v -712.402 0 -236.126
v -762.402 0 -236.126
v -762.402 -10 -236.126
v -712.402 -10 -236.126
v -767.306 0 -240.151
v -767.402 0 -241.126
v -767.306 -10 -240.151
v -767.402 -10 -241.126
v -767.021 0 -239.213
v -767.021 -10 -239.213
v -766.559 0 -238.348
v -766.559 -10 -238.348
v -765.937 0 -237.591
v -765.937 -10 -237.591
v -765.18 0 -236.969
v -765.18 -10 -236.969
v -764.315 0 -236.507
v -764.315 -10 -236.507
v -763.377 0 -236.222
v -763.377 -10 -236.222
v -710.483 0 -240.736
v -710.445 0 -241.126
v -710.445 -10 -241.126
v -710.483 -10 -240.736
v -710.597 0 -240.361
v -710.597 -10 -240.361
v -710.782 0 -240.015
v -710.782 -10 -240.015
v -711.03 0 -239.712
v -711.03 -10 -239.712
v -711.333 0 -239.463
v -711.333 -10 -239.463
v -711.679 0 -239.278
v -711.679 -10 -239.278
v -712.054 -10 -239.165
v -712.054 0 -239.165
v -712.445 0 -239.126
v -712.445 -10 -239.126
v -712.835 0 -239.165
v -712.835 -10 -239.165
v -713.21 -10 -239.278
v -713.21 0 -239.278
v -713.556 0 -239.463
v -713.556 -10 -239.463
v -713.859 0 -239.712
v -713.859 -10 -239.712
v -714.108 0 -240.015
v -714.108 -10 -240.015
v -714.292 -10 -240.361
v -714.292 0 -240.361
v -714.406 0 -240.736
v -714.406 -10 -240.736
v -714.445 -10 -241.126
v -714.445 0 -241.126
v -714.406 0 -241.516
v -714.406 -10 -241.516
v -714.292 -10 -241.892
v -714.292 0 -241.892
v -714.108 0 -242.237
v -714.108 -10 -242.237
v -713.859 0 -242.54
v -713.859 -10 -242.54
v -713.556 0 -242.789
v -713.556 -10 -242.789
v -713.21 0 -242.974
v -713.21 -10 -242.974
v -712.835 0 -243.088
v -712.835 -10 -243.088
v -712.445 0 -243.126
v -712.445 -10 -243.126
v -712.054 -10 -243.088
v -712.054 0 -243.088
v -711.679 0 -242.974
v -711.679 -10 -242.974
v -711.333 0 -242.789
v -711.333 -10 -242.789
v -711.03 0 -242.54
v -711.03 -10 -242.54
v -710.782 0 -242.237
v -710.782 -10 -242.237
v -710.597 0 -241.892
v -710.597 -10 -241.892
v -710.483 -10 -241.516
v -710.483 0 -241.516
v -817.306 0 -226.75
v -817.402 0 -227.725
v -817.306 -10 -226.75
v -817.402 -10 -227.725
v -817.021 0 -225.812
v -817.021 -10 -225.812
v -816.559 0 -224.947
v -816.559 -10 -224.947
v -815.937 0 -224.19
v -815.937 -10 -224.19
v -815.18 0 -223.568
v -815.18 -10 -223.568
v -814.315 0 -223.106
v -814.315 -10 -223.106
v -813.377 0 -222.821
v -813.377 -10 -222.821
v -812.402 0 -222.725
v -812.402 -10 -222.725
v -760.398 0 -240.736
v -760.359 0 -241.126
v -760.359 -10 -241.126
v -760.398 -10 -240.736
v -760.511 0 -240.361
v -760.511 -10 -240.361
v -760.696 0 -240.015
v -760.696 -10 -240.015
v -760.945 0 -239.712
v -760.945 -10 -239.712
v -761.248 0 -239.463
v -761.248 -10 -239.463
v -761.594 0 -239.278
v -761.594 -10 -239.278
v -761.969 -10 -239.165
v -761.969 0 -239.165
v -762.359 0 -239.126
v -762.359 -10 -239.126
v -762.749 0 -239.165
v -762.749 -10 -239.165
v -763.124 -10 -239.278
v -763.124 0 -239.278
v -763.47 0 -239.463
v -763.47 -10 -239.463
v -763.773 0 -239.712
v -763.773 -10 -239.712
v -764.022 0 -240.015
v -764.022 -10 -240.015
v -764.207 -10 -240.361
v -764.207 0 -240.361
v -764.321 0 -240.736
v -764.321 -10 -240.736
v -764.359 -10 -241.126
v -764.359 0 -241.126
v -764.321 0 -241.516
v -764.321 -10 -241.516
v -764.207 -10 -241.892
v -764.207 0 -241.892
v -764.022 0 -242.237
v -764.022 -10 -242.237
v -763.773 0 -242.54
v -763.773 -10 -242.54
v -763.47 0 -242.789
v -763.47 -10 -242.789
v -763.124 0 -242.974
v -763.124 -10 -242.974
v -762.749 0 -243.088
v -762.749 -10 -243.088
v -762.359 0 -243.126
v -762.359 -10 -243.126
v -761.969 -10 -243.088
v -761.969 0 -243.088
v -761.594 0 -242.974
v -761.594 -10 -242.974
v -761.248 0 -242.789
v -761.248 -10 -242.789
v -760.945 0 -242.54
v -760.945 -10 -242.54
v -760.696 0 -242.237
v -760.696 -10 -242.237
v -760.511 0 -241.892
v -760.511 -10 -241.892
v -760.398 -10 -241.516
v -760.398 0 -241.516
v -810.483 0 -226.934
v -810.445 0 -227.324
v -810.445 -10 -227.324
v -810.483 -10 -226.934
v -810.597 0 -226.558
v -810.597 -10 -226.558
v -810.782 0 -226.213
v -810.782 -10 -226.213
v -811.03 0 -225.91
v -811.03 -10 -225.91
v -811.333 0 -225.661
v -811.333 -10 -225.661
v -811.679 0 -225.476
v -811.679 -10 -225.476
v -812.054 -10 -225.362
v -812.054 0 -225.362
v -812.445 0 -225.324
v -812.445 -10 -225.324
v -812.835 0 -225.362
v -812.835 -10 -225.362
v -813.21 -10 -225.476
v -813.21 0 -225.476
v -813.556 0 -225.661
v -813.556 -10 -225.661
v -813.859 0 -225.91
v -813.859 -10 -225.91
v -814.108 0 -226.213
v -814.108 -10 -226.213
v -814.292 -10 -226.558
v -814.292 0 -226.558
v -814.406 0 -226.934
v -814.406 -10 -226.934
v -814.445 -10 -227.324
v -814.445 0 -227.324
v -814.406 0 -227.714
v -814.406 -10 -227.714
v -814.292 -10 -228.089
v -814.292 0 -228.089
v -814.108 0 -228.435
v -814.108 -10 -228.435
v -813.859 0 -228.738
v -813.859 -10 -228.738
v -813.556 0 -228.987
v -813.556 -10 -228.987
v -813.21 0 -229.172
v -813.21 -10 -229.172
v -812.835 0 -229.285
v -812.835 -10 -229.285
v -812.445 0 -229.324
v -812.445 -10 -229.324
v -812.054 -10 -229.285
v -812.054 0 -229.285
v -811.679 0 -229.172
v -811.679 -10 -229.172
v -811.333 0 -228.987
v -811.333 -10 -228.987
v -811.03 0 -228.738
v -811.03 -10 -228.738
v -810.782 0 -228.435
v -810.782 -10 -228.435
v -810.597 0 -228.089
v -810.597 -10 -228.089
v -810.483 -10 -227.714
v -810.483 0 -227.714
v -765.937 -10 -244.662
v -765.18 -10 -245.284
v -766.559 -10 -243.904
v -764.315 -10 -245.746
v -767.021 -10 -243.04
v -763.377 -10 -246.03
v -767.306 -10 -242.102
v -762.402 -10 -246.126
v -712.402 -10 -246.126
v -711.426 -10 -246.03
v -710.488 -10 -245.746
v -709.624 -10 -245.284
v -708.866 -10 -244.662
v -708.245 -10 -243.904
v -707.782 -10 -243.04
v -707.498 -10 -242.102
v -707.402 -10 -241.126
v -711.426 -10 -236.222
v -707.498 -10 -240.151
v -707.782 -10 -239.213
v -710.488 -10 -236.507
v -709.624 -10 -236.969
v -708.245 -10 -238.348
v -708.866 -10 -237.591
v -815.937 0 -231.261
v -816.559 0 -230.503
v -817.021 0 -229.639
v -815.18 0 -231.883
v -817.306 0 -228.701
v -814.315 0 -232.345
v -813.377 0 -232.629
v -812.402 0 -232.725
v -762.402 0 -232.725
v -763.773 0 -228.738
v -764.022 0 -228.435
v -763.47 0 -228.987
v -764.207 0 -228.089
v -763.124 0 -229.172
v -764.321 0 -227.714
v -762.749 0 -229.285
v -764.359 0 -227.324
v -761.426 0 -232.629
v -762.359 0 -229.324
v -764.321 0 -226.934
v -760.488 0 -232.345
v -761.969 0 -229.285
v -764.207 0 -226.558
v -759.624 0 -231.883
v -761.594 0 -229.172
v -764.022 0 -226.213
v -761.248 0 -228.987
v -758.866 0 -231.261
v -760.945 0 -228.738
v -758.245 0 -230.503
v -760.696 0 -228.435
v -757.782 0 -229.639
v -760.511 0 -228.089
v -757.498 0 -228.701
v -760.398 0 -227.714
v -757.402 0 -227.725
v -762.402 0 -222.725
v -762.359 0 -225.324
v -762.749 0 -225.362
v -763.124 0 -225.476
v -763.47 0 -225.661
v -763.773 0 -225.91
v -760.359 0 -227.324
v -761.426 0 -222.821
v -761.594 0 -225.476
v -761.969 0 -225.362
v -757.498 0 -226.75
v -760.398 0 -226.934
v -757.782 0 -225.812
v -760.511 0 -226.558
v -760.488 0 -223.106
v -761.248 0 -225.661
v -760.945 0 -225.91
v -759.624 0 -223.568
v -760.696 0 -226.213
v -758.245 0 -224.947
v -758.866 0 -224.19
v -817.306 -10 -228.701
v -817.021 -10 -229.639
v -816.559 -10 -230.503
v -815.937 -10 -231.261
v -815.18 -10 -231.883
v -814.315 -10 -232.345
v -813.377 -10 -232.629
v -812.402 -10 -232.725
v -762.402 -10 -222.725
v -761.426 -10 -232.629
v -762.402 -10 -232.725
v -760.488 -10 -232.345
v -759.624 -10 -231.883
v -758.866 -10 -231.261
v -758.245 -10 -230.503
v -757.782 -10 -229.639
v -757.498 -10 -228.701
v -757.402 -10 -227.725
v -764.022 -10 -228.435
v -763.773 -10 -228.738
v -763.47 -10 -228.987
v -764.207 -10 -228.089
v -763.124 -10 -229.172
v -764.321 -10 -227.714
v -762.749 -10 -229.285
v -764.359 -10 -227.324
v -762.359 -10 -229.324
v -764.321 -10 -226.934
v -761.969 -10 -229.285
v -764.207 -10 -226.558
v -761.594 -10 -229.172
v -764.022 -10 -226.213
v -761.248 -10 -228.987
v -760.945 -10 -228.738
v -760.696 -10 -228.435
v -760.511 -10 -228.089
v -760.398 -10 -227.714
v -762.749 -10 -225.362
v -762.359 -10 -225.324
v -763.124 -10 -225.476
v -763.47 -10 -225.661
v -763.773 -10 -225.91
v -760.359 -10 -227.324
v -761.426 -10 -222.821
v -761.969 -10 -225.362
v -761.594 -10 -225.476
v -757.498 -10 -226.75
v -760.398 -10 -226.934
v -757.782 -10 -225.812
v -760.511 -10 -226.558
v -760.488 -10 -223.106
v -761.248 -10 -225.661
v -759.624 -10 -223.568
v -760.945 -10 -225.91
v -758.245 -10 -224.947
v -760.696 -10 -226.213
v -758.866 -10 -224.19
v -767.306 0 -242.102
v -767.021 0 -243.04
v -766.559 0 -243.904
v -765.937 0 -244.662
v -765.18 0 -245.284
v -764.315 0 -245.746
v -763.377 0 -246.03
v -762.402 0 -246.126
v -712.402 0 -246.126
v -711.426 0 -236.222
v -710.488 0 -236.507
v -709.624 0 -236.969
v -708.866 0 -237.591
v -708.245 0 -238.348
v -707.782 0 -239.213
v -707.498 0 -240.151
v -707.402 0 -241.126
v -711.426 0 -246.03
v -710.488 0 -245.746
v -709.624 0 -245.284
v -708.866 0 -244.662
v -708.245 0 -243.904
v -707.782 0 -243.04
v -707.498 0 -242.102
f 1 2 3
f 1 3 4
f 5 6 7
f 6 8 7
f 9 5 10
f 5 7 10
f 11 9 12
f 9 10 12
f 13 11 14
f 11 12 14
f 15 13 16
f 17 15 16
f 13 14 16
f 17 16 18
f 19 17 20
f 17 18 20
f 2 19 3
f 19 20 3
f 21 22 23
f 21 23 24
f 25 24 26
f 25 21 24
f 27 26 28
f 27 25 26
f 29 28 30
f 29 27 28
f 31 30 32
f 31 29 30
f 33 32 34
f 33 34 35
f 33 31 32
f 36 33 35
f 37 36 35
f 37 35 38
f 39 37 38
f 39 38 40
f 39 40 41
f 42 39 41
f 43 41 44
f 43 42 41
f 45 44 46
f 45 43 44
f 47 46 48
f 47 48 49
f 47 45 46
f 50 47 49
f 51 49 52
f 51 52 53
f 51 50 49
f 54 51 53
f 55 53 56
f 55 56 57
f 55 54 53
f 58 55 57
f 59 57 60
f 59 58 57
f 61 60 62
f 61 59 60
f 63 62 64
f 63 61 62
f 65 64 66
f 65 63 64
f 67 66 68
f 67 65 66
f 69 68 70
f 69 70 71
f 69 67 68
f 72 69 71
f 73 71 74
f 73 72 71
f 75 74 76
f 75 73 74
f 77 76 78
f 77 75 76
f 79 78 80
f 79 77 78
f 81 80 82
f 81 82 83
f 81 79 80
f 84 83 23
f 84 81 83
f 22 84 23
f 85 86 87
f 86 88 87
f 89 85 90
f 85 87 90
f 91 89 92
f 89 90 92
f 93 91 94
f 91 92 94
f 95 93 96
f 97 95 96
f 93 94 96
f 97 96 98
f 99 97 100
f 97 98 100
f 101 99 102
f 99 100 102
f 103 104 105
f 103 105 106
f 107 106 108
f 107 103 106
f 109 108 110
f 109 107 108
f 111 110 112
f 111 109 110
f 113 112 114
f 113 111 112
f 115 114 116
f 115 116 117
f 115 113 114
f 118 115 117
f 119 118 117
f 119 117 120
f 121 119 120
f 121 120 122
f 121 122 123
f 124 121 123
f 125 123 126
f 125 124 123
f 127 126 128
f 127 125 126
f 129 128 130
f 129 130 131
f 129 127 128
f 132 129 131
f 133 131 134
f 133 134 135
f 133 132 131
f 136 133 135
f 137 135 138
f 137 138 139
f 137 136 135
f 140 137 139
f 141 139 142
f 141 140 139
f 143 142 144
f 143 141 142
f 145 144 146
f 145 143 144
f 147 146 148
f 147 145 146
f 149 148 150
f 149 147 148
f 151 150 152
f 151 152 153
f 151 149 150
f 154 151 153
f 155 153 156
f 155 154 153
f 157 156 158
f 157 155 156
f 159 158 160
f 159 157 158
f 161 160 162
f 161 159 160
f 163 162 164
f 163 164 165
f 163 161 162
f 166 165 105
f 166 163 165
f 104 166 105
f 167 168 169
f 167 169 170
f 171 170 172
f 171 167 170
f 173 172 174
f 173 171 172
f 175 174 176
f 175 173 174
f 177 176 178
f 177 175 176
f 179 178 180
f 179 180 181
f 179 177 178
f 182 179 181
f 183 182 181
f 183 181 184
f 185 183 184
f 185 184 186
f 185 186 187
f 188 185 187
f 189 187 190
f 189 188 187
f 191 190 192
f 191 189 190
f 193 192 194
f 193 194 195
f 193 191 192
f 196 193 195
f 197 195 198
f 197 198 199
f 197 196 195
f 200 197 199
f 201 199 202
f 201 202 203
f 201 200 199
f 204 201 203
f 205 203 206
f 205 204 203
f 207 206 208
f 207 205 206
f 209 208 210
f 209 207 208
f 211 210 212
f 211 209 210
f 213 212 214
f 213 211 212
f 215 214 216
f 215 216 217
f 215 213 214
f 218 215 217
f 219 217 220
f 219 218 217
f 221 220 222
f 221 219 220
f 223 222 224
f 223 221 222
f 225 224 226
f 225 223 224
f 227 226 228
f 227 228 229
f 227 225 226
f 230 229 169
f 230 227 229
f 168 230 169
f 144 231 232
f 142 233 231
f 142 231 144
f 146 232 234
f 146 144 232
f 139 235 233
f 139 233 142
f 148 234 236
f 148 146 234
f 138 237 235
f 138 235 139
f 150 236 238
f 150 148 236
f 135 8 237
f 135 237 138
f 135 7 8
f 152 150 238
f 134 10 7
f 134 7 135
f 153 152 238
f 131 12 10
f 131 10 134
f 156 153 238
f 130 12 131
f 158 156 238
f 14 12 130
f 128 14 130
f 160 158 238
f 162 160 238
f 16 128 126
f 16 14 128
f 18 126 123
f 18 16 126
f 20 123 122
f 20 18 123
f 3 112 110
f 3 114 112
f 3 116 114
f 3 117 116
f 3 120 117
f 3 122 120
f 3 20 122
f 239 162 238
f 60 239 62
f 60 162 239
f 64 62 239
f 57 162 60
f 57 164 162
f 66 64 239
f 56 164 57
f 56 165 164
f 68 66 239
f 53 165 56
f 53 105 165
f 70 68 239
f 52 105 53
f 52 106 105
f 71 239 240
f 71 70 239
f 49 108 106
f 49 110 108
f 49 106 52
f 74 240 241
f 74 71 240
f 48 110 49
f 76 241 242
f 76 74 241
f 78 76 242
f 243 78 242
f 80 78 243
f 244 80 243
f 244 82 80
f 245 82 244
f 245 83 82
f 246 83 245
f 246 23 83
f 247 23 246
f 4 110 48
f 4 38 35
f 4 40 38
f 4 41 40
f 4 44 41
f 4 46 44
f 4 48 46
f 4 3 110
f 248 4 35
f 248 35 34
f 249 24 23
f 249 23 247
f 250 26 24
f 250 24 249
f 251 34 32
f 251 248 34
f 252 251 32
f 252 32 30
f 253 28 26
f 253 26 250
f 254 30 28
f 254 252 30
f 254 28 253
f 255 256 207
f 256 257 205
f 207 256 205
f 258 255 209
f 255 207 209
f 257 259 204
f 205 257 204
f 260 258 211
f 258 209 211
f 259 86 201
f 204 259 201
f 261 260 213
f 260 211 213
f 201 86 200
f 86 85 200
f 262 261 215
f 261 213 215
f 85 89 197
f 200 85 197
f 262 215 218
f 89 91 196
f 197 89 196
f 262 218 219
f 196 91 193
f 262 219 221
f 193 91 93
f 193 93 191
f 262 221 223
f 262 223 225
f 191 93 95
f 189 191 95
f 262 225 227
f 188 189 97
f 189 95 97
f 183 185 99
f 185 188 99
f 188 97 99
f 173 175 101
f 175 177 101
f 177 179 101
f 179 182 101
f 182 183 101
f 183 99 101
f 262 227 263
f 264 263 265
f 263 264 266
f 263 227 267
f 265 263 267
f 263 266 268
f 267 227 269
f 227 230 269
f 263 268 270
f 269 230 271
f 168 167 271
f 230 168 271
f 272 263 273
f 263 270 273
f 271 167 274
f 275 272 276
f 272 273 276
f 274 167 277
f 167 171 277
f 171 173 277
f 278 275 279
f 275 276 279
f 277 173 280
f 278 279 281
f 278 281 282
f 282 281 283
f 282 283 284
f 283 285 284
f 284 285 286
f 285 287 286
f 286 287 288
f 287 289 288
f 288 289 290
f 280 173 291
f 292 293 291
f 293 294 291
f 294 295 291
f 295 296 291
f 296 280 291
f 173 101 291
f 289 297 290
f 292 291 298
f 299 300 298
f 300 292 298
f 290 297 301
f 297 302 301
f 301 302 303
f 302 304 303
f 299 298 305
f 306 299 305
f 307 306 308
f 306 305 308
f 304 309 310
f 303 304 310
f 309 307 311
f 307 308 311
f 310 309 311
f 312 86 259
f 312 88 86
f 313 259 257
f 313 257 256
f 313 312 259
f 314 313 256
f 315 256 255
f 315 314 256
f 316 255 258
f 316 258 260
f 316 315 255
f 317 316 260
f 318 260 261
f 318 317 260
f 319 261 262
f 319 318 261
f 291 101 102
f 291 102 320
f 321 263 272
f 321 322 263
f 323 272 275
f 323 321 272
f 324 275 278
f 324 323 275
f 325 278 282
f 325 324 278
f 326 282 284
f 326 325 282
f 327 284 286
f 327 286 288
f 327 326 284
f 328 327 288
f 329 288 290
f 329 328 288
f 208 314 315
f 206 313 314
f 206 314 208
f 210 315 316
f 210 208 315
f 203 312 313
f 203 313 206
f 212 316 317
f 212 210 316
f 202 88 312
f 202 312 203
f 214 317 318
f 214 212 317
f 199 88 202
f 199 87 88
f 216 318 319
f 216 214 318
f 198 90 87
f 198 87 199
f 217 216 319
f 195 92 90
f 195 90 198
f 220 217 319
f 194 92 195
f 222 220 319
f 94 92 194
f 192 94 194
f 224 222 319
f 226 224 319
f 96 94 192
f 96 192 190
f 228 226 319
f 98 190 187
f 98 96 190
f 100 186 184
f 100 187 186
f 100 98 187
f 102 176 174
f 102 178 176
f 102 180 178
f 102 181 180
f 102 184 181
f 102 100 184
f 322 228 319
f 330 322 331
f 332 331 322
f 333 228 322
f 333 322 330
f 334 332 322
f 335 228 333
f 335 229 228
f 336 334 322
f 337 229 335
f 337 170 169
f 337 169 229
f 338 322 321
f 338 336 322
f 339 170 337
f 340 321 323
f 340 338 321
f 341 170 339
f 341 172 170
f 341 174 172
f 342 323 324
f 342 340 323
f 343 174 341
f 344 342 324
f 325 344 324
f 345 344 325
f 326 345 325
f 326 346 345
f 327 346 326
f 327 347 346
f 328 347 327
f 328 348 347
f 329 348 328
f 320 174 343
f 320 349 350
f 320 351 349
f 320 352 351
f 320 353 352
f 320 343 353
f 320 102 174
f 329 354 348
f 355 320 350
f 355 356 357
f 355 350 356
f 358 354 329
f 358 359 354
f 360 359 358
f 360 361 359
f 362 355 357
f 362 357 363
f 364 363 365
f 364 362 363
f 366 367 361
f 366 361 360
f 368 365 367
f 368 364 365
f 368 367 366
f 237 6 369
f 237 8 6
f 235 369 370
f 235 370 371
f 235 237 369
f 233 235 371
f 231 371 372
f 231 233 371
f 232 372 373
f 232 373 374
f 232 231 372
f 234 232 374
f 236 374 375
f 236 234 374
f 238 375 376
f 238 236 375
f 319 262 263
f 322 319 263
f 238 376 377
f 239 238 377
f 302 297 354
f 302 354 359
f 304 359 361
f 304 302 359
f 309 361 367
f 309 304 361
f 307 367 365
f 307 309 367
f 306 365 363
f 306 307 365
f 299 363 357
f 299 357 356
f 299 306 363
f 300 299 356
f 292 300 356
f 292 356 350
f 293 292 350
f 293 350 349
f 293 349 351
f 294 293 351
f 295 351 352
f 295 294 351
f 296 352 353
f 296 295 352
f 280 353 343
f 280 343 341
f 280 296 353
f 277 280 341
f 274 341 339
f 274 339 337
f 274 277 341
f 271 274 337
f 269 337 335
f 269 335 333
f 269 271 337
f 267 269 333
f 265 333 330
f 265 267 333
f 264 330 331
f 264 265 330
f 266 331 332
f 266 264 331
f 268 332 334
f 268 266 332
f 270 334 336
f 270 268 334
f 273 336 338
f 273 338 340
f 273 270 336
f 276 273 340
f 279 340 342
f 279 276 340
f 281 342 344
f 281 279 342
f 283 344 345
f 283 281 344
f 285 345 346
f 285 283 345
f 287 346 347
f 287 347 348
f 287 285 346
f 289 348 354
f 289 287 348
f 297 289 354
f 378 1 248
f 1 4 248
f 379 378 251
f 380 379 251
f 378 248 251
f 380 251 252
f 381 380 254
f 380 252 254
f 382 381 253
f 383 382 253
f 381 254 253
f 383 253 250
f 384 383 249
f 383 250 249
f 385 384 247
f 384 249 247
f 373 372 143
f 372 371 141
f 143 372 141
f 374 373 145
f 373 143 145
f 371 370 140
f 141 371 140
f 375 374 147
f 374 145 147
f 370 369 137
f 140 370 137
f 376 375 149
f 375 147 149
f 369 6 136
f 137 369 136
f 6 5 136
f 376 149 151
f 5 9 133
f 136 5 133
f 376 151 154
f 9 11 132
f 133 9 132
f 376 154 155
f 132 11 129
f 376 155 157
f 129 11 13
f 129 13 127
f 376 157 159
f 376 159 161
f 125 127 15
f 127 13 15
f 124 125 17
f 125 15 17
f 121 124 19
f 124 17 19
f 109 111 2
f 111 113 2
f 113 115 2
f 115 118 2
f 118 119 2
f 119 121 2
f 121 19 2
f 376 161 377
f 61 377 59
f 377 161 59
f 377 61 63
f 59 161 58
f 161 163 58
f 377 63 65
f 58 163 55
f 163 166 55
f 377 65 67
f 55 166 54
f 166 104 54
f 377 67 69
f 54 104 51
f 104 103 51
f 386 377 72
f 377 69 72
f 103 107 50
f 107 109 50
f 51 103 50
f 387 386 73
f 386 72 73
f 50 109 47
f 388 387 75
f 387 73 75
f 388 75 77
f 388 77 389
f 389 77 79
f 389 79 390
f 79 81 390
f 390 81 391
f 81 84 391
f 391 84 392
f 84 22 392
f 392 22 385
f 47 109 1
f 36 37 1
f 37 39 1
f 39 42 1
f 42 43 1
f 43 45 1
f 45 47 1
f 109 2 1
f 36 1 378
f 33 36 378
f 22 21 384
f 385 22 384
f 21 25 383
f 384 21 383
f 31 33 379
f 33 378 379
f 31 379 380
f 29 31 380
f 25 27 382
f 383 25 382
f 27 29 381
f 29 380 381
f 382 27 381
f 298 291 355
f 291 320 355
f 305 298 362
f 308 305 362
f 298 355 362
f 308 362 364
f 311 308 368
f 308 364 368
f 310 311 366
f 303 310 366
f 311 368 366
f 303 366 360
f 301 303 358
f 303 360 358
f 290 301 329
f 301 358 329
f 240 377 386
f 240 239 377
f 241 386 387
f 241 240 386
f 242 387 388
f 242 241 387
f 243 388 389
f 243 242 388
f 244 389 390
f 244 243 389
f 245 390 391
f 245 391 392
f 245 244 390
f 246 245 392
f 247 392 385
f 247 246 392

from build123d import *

# Parameters (mm, degrees)
F0_W     = 60
F0_H     = 10
F0_R     = 2
F1_DEPTH = 10
F2_R     = 4.99999
F2_2_R   = 4.99999


# Not quite as in the source:
# - a fillet or chamfer is up to 0.001 mm smaller than in the source, because OpenCascade refuses the exact size


with BuildPart() as f1:
    # F0 (on Front) → F1 (new body)
    with BuildSketch(Plane.XZ):
        with Locations((-787.4018650077, -227.7252674103)):
            Rectangle(F0_W, F0_H)
        with Locations((-812.4446220431, -227.3237803578)):
            Circle(F0_R, mode=Mode.SUBTRACT)
        with Locations((-762.3591079723, -227.3237803578)):
            Circle(F0_R, mode=Mode.SUBTRACT)
    extrude(amount=F1_DEPTH)

    # F2 (radius 5 in the source; OpenCascade refuses exactly that, so slightly less here)
    f2_edges = [f1.edges().sort_by_distance(p)[0] for p in [
        (-757.401865, -5, -222.725267),
        (-757.401865, -5, -232.725267),
        (-817.401865, -5, -222.725267),
        (-817.401865, -5, -232.725267),
    ]]
    fillet(f2_edges, radius=F2_R)


with BuildPart() as f1b:
    # F0 (on Front) → F1, piece 2 (new body)
    with BuildSketch(Plane.XZ):
        with Locations((-737.4018650077, -241.1261898279)):
            Rectangle(F0_W, F0_H)
        with Locations((-762.3591079723, -241.1261898279)):
            Circle(F0_R, mode=Mode.SUBTRACT)
        with Locations((-712.4446220431, -241.1261898279)):
            Circle(F0_R, mode=Mode.SUBTRACT)
    extrude(amount=F1_DEPTH)

    # F2#2 (radius 5 in the source; OpenCascade refuses exactly that, so slightly less here)
    f2_2_edges = [f1b.edges().sort_by_distance(p)[0] for p in [
        (-767.401865, -5, -236.12619),
        (-767.401865, -5, -246.12619),
        (-707.401865, -5, -236.12619),
        (-707.401865, -5, -246.12619),
    ]]
    fillet(f2_2_edges, radius=F2_2_R)


solid = Compound([f1.part, f1b.part])
